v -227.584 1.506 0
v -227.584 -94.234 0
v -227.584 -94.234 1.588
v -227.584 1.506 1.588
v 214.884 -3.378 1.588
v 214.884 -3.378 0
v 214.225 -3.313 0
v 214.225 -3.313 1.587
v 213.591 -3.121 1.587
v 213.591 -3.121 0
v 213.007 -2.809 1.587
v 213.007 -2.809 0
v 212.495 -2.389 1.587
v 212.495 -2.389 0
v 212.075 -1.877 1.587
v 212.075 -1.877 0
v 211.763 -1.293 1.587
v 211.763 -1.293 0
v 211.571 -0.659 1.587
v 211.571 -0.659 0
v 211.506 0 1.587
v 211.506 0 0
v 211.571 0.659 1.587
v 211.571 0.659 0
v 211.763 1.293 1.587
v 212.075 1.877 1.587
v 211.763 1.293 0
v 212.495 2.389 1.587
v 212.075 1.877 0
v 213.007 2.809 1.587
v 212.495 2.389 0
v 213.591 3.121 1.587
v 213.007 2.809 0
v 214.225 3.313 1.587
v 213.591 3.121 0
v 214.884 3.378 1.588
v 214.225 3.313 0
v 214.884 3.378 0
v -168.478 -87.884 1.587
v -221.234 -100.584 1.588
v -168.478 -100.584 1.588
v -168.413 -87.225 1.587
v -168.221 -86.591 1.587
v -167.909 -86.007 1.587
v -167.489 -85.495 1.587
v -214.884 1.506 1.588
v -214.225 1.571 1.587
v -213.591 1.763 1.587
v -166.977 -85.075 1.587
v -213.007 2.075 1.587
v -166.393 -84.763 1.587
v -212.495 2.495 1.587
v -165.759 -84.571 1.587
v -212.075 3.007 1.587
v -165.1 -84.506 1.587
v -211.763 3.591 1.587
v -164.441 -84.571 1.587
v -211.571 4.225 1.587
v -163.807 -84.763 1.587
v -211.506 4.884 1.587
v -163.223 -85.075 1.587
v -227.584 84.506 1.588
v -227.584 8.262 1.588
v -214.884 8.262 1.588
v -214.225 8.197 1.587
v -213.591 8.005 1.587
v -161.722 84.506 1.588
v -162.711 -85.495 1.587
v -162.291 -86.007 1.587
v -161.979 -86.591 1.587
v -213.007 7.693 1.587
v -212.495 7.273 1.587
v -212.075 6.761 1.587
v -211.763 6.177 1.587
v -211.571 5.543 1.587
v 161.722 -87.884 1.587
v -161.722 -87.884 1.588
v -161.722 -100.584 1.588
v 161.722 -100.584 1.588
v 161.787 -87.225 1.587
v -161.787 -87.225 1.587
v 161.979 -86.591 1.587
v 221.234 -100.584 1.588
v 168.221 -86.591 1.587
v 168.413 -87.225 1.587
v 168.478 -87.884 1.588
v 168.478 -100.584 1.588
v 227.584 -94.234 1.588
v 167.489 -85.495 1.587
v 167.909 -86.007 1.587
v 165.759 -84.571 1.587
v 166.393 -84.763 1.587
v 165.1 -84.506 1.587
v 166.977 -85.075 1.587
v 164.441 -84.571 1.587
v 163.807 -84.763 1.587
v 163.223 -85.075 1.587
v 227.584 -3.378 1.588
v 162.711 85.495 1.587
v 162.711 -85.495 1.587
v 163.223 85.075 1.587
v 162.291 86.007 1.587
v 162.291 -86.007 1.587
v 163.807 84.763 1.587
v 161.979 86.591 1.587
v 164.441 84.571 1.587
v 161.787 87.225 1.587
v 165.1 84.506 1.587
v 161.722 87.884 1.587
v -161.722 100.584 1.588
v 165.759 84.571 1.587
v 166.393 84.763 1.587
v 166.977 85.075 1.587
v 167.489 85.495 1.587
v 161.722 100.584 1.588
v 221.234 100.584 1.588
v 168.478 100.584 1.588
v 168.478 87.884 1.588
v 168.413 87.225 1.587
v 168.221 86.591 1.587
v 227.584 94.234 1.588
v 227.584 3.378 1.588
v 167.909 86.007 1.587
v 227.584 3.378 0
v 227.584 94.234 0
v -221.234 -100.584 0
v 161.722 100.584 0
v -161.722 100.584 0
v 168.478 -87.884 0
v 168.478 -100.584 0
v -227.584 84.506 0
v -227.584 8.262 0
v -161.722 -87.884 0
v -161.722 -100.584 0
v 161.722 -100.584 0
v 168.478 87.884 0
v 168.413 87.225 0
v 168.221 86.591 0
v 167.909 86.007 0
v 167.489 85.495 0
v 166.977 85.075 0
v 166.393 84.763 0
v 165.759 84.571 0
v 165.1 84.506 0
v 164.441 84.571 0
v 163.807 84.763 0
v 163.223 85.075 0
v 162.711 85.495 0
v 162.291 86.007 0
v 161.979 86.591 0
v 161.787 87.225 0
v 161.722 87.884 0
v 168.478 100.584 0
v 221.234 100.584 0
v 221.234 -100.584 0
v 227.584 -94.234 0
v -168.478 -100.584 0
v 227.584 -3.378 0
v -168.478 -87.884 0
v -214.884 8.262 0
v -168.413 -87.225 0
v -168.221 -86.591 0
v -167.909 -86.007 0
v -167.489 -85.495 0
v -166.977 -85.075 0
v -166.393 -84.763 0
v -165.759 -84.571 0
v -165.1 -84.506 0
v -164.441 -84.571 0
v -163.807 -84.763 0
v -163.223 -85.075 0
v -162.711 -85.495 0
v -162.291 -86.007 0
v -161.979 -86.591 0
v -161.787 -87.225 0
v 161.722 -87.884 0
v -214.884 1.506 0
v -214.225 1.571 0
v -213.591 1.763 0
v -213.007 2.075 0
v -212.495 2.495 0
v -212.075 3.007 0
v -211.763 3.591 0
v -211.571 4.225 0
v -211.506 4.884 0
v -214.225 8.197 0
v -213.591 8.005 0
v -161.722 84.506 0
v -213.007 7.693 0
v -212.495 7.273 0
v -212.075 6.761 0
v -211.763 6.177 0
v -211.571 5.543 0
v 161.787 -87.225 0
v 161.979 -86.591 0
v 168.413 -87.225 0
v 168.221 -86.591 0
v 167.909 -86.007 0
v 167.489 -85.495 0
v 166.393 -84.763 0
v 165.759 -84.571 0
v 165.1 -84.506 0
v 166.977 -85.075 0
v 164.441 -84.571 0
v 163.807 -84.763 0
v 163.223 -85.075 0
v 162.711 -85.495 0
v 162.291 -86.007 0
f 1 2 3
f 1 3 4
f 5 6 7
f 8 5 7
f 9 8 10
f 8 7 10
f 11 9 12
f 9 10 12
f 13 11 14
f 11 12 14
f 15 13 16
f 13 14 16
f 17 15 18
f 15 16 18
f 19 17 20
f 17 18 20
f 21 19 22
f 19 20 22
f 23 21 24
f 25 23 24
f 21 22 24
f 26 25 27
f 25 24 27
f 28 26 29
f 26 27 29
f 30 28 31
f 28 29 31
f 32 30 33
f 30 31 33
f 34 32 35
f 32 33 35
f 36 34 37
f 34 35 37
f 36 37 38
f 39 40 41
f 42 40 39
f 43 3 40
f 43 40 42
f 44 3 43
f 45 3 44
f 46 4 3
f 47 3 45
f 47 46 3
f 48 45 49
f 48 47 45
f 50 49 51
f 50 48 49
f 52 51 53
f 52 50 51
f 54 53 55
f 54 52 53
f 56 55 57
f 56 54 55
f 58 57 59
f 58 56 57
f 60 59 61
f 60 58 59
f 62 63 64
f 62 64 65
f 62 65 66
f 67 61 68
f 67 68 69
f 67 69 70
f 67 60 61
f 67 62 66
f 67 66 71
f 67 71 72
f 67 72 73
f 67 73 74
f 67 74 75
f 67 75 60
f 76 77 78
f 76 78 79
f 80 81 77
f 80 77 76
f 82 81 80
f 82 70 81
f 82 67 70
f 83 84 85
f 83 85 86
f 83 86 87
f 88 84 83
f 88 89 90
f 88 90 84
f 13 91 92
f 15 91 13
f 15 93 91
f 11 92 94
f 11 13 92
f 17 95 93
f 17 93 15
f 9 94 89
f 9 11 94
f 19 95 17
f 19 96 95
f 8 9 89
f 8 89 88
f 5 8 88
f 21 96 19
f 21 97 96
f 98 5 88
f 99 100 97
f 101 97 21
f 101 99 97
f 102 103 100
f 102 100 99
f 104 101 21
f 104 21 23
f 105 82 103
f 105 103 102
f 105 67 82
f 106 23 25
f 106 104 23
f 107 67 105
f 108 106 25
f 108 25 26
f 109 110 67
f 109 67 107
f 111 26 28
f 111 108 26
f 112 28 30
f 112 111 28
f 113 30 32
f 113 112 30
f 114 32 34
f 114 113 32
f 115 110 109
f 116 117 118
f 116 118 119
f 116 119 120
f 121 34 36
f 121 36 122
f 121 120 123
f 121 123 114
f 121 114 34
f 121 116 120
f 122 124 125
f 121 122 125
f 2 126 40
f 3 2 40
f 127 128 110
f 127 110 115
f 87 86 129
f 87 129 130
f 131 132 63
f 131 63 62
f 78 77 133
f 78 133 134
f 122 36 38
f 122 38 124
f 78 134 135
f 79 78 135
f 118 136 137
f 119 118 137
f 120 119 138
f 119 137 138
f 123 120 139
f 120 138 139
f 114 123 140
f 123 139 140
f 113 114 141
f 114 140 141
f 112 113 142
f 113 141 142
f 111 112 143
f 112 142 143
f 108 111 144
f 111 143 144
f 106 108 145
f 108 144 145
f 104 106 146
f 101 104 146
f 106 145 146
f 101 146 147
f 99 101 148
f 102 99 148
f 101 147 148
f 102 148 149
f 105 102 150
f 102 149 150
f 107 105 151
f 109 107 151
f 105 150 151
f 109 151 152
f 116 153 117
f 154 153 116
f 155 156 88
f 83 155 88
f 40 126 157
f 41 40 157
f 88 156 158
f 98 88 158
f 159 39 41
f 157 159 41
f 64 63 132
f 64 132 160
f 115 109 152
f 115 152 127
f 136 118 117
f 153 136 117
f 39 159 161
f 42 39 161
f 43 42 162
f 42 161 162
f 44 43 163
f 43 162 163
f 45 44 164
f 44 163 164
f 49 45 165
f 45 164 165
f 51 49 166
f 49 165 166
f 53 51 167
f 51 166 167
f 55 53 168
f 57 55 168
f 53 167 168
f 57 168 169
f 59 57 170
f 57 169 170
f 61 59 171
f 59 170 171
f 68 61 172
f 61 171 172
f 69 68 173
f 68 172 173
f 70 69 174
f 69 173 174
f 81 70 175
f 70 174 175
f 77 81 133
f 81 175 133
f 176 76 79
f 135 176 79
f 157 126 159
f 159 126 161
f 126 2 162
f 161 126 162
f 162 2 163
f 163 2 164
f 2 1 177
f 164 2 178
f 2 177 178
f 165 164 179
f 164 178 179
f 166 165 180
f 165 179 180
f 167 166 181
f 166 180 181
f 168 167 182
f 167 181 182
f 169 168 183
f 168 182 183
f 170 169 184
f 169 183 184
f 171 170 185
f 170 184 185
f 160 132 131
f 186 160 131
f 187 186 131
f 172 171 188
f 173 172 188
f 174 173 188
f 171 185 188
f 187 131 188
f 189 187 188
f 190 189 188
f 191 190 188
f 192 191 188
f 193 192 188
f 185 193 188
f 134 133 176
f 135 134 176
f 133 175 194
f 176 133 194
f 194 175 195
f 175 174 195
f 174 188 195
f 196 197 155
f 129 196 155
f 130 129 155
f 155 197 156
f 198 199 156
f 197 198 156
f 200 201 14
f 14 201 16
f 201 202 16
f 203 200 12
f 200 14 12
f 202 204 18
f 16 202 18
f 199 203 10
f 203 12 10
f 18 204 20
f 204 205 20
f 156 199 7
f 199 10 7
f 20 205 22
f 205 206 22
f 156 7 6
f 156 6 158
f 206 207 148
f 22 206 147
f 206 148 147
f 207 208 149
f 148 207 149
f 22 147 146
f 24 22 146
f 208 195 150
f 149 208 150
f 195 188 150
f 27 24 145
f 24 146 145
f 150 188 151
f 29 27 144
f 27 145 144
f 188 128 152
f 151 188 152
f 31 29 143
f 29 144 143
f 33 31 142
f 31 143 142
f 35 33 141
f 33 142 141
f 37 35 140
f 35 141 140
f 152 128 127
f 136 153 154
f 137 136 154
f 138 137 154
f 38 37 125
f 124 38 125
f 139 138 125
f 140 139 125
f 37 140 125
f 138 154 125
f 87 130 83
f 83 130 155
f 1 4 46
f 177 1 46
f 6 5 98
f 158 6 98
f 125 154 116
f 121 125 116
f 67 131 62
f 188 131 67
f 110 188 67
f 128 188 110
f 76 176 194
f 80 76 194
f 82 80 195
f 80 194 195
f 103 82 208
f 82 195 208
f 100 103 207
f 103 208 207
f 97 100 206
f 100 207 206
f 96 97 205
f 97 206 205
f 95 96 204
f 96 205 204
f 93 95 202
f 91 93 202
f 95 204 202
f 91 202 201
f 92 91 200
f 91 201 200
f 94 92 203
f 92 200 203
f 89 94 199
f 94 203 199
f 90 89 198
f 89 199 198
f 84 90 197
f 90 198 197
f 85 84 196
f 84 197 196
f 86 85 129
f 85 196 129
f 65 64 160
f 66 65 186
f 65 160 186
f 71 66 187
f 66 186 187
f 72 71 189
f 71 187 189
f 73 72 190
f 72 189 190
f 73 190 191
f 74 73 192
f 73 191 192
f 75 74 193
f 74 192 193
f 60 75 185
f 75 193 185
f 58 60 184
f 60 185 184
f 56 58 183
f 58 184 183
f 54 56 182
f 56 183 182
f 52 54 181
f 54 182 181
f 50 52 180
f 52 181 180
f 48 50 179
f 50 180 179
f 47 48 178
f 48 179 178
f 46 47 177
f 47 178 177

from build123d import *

# Parameters (mm, degrees)
SKETCH1_W               = 455.168
SKETCH1_H               = 201.168
BOSS_EXTRUDE1_DEPTH     = 1.5875
F_1_4_CLEARANCE_HOLE1_D = 6.7564
CUT_EXTRUDE1_REACH      = 250.826
SKETCH6_W               = 6.7564
SKETCH6_H               = 14.478
CUT_EXTRUDE2_REACH      = 250.826
SKETCH7_W               = 12.7
SKETCH7_H               = 6.7564
CUT_EXTRUDE3_DEPTH      = 249.825517719
CHAMFER1_SIZE           = 6.35


with BuildPart() as part:
    # Sketch1 → Boss-Extrude1 (new body)
    with BuildSketch(Plane.XY):
        Rectangle(SKETCH1_W, SKETCH1_H)
    extrude(amount=BOSS_EXTRUDE1_DEPTH)

    # 1/4 Clearance Hole1 (through all)
    with Locations(Plane.XY.offset(1.5875)):
        with Locations((-165.1, 87.884), (165.1, 87.884), (214.884, 0), (-165.1, -87.884), (165.1, -87.884), (-214.884, 4.884)):
            Hole(F_1_4_CLEARANCE_HOLE1_D / 2)

    # Sketch6 → Cut-Extrude1 (cut, up to next)
    with BuildSketch(Plane.XY.offset(1.5875), mode=Mode.PRIVATE) as cut_extrude1_sk1:
        with Locations((-165.1, 95.123)):
            Rectangle(SKETCH6_W, SKETCH6_H)
    cut_extrude1_tool1 = extrude(cut_extrude1_sk1.sketch, amount=-CUT_EXTRUDE1_REACH, mode=Mode.PRIVATE) & part.part
    # Sketch6 → Cut-Extrude1 (cut, up to next)
    with BuildSketch(Plane.XY.offset(1.5875), mode=Mode.PRIVATE) as cut_extrude1_sk2:
        with Locations((165.1, 95.123)):
            Rectangle(SKETCH6_W, SKETCH6_H)
    cut_extrude1_tool2 = extrude(cut_extrude1_sk2.sketch, amount=-CUT_EXTRUDE1_REACH, mode=Mode.PRIVATE) & part.part
    cut_extrude1_1 = cut_extrude1_tool1.solids().sort_by_distance((-165.1, 95.123, 1.5875))[0]
    add(cut_extrude1_1, mode=Mode.SUBTRACT)
    cut_extrude1_2 = cut_extrude1_tool2.solids().sort_by_distance((165.1, 95.123, 1.5875))[0]
    add(cut_extrude1_2, mode=Mode.SUBTRACT)
    cut_extrude1 = cut_extrude1_1 + cut_extrude1_2  # Cut-Extrude1 as one shape, for the pattern or mirror that repeats it

    # Mirror1: Cut-Extrude1 across plane
    add(cut_extrude1.mirror(Plane.ZX), mode=Mode.SUBTRACT)

    # Sketch7 → Cut-Extrude2 (cut, up to next)
    with BuildSketch(Plane.XY.offset(1.5875), mode=Mode.PRIVATE) as cut_extrude2_sk1:
        with Locations((-221.234, 4.884)):
            Rectangle(SKETCH7_W, SKETCH7_H)
    cut_extrude2_tool1 = extrude(cut_extrude2_sk1.sketch, amount=-CUT_EXTRUDE2_REACH, mode=Mode.PRIVATE) & part.part
    # Sketch7 → Cut-Extrude2 (cut, up to next)
    with BuildSketch(Plane.XY.offset(1.5875), mode=Mode.PRIVATE) as cut_extrude2_sk2:
        with Locations((221.234, 0)):
            Rectangle(SKETCH7_W, SKETCH7_H)
    cut_extrude2_tool2 = extrude(cut_extrude2_sk2.sketch, amount=-CUT_EXTRUDE2_REACH, mode=Mode.PRIVATE) & part.part
    add(cut_extrude2_tool1.solids().sort_by_distance((-221.234, 4.884, 1.5875))[0], mode=Mode.SUBTRACT)
    add(cut_extrude2_tool2.solids().sort_by_distance((221.234, 0, 1.5875))[0], mode=Mode.SUBTRACT)

    # Sketch8 → Cut-Extrude3 (cut, through all)
    with BuildSketch(Plane(origin=(0, 0, 0), x_dir=(-1, 0, 0), z_dir=(0, 0, -1))):
        Polygon((168.4782, 100.584), (227.584, 100.584), (227.584, 84.5058), (161.7218, 84.5058), (161.7218, 100.584), align=None)
    extrude(amount=-CUT_EXTRUDE3_DEPTH, mode=Mode.SUBTRACT)

    # Chamfer1
    chamfer1_edges = [part.edges().sort_by_distance(p)[0] for p in [
        (227.584, -100.584, 0.79375),
        (-227.584, -100.584, 0.79375),
        (227.584, 100.584, 0.79375),
    ]]
    chamfer(chamfer1_edges, length=CHAMFER1_SIZE)


solid = part.part
